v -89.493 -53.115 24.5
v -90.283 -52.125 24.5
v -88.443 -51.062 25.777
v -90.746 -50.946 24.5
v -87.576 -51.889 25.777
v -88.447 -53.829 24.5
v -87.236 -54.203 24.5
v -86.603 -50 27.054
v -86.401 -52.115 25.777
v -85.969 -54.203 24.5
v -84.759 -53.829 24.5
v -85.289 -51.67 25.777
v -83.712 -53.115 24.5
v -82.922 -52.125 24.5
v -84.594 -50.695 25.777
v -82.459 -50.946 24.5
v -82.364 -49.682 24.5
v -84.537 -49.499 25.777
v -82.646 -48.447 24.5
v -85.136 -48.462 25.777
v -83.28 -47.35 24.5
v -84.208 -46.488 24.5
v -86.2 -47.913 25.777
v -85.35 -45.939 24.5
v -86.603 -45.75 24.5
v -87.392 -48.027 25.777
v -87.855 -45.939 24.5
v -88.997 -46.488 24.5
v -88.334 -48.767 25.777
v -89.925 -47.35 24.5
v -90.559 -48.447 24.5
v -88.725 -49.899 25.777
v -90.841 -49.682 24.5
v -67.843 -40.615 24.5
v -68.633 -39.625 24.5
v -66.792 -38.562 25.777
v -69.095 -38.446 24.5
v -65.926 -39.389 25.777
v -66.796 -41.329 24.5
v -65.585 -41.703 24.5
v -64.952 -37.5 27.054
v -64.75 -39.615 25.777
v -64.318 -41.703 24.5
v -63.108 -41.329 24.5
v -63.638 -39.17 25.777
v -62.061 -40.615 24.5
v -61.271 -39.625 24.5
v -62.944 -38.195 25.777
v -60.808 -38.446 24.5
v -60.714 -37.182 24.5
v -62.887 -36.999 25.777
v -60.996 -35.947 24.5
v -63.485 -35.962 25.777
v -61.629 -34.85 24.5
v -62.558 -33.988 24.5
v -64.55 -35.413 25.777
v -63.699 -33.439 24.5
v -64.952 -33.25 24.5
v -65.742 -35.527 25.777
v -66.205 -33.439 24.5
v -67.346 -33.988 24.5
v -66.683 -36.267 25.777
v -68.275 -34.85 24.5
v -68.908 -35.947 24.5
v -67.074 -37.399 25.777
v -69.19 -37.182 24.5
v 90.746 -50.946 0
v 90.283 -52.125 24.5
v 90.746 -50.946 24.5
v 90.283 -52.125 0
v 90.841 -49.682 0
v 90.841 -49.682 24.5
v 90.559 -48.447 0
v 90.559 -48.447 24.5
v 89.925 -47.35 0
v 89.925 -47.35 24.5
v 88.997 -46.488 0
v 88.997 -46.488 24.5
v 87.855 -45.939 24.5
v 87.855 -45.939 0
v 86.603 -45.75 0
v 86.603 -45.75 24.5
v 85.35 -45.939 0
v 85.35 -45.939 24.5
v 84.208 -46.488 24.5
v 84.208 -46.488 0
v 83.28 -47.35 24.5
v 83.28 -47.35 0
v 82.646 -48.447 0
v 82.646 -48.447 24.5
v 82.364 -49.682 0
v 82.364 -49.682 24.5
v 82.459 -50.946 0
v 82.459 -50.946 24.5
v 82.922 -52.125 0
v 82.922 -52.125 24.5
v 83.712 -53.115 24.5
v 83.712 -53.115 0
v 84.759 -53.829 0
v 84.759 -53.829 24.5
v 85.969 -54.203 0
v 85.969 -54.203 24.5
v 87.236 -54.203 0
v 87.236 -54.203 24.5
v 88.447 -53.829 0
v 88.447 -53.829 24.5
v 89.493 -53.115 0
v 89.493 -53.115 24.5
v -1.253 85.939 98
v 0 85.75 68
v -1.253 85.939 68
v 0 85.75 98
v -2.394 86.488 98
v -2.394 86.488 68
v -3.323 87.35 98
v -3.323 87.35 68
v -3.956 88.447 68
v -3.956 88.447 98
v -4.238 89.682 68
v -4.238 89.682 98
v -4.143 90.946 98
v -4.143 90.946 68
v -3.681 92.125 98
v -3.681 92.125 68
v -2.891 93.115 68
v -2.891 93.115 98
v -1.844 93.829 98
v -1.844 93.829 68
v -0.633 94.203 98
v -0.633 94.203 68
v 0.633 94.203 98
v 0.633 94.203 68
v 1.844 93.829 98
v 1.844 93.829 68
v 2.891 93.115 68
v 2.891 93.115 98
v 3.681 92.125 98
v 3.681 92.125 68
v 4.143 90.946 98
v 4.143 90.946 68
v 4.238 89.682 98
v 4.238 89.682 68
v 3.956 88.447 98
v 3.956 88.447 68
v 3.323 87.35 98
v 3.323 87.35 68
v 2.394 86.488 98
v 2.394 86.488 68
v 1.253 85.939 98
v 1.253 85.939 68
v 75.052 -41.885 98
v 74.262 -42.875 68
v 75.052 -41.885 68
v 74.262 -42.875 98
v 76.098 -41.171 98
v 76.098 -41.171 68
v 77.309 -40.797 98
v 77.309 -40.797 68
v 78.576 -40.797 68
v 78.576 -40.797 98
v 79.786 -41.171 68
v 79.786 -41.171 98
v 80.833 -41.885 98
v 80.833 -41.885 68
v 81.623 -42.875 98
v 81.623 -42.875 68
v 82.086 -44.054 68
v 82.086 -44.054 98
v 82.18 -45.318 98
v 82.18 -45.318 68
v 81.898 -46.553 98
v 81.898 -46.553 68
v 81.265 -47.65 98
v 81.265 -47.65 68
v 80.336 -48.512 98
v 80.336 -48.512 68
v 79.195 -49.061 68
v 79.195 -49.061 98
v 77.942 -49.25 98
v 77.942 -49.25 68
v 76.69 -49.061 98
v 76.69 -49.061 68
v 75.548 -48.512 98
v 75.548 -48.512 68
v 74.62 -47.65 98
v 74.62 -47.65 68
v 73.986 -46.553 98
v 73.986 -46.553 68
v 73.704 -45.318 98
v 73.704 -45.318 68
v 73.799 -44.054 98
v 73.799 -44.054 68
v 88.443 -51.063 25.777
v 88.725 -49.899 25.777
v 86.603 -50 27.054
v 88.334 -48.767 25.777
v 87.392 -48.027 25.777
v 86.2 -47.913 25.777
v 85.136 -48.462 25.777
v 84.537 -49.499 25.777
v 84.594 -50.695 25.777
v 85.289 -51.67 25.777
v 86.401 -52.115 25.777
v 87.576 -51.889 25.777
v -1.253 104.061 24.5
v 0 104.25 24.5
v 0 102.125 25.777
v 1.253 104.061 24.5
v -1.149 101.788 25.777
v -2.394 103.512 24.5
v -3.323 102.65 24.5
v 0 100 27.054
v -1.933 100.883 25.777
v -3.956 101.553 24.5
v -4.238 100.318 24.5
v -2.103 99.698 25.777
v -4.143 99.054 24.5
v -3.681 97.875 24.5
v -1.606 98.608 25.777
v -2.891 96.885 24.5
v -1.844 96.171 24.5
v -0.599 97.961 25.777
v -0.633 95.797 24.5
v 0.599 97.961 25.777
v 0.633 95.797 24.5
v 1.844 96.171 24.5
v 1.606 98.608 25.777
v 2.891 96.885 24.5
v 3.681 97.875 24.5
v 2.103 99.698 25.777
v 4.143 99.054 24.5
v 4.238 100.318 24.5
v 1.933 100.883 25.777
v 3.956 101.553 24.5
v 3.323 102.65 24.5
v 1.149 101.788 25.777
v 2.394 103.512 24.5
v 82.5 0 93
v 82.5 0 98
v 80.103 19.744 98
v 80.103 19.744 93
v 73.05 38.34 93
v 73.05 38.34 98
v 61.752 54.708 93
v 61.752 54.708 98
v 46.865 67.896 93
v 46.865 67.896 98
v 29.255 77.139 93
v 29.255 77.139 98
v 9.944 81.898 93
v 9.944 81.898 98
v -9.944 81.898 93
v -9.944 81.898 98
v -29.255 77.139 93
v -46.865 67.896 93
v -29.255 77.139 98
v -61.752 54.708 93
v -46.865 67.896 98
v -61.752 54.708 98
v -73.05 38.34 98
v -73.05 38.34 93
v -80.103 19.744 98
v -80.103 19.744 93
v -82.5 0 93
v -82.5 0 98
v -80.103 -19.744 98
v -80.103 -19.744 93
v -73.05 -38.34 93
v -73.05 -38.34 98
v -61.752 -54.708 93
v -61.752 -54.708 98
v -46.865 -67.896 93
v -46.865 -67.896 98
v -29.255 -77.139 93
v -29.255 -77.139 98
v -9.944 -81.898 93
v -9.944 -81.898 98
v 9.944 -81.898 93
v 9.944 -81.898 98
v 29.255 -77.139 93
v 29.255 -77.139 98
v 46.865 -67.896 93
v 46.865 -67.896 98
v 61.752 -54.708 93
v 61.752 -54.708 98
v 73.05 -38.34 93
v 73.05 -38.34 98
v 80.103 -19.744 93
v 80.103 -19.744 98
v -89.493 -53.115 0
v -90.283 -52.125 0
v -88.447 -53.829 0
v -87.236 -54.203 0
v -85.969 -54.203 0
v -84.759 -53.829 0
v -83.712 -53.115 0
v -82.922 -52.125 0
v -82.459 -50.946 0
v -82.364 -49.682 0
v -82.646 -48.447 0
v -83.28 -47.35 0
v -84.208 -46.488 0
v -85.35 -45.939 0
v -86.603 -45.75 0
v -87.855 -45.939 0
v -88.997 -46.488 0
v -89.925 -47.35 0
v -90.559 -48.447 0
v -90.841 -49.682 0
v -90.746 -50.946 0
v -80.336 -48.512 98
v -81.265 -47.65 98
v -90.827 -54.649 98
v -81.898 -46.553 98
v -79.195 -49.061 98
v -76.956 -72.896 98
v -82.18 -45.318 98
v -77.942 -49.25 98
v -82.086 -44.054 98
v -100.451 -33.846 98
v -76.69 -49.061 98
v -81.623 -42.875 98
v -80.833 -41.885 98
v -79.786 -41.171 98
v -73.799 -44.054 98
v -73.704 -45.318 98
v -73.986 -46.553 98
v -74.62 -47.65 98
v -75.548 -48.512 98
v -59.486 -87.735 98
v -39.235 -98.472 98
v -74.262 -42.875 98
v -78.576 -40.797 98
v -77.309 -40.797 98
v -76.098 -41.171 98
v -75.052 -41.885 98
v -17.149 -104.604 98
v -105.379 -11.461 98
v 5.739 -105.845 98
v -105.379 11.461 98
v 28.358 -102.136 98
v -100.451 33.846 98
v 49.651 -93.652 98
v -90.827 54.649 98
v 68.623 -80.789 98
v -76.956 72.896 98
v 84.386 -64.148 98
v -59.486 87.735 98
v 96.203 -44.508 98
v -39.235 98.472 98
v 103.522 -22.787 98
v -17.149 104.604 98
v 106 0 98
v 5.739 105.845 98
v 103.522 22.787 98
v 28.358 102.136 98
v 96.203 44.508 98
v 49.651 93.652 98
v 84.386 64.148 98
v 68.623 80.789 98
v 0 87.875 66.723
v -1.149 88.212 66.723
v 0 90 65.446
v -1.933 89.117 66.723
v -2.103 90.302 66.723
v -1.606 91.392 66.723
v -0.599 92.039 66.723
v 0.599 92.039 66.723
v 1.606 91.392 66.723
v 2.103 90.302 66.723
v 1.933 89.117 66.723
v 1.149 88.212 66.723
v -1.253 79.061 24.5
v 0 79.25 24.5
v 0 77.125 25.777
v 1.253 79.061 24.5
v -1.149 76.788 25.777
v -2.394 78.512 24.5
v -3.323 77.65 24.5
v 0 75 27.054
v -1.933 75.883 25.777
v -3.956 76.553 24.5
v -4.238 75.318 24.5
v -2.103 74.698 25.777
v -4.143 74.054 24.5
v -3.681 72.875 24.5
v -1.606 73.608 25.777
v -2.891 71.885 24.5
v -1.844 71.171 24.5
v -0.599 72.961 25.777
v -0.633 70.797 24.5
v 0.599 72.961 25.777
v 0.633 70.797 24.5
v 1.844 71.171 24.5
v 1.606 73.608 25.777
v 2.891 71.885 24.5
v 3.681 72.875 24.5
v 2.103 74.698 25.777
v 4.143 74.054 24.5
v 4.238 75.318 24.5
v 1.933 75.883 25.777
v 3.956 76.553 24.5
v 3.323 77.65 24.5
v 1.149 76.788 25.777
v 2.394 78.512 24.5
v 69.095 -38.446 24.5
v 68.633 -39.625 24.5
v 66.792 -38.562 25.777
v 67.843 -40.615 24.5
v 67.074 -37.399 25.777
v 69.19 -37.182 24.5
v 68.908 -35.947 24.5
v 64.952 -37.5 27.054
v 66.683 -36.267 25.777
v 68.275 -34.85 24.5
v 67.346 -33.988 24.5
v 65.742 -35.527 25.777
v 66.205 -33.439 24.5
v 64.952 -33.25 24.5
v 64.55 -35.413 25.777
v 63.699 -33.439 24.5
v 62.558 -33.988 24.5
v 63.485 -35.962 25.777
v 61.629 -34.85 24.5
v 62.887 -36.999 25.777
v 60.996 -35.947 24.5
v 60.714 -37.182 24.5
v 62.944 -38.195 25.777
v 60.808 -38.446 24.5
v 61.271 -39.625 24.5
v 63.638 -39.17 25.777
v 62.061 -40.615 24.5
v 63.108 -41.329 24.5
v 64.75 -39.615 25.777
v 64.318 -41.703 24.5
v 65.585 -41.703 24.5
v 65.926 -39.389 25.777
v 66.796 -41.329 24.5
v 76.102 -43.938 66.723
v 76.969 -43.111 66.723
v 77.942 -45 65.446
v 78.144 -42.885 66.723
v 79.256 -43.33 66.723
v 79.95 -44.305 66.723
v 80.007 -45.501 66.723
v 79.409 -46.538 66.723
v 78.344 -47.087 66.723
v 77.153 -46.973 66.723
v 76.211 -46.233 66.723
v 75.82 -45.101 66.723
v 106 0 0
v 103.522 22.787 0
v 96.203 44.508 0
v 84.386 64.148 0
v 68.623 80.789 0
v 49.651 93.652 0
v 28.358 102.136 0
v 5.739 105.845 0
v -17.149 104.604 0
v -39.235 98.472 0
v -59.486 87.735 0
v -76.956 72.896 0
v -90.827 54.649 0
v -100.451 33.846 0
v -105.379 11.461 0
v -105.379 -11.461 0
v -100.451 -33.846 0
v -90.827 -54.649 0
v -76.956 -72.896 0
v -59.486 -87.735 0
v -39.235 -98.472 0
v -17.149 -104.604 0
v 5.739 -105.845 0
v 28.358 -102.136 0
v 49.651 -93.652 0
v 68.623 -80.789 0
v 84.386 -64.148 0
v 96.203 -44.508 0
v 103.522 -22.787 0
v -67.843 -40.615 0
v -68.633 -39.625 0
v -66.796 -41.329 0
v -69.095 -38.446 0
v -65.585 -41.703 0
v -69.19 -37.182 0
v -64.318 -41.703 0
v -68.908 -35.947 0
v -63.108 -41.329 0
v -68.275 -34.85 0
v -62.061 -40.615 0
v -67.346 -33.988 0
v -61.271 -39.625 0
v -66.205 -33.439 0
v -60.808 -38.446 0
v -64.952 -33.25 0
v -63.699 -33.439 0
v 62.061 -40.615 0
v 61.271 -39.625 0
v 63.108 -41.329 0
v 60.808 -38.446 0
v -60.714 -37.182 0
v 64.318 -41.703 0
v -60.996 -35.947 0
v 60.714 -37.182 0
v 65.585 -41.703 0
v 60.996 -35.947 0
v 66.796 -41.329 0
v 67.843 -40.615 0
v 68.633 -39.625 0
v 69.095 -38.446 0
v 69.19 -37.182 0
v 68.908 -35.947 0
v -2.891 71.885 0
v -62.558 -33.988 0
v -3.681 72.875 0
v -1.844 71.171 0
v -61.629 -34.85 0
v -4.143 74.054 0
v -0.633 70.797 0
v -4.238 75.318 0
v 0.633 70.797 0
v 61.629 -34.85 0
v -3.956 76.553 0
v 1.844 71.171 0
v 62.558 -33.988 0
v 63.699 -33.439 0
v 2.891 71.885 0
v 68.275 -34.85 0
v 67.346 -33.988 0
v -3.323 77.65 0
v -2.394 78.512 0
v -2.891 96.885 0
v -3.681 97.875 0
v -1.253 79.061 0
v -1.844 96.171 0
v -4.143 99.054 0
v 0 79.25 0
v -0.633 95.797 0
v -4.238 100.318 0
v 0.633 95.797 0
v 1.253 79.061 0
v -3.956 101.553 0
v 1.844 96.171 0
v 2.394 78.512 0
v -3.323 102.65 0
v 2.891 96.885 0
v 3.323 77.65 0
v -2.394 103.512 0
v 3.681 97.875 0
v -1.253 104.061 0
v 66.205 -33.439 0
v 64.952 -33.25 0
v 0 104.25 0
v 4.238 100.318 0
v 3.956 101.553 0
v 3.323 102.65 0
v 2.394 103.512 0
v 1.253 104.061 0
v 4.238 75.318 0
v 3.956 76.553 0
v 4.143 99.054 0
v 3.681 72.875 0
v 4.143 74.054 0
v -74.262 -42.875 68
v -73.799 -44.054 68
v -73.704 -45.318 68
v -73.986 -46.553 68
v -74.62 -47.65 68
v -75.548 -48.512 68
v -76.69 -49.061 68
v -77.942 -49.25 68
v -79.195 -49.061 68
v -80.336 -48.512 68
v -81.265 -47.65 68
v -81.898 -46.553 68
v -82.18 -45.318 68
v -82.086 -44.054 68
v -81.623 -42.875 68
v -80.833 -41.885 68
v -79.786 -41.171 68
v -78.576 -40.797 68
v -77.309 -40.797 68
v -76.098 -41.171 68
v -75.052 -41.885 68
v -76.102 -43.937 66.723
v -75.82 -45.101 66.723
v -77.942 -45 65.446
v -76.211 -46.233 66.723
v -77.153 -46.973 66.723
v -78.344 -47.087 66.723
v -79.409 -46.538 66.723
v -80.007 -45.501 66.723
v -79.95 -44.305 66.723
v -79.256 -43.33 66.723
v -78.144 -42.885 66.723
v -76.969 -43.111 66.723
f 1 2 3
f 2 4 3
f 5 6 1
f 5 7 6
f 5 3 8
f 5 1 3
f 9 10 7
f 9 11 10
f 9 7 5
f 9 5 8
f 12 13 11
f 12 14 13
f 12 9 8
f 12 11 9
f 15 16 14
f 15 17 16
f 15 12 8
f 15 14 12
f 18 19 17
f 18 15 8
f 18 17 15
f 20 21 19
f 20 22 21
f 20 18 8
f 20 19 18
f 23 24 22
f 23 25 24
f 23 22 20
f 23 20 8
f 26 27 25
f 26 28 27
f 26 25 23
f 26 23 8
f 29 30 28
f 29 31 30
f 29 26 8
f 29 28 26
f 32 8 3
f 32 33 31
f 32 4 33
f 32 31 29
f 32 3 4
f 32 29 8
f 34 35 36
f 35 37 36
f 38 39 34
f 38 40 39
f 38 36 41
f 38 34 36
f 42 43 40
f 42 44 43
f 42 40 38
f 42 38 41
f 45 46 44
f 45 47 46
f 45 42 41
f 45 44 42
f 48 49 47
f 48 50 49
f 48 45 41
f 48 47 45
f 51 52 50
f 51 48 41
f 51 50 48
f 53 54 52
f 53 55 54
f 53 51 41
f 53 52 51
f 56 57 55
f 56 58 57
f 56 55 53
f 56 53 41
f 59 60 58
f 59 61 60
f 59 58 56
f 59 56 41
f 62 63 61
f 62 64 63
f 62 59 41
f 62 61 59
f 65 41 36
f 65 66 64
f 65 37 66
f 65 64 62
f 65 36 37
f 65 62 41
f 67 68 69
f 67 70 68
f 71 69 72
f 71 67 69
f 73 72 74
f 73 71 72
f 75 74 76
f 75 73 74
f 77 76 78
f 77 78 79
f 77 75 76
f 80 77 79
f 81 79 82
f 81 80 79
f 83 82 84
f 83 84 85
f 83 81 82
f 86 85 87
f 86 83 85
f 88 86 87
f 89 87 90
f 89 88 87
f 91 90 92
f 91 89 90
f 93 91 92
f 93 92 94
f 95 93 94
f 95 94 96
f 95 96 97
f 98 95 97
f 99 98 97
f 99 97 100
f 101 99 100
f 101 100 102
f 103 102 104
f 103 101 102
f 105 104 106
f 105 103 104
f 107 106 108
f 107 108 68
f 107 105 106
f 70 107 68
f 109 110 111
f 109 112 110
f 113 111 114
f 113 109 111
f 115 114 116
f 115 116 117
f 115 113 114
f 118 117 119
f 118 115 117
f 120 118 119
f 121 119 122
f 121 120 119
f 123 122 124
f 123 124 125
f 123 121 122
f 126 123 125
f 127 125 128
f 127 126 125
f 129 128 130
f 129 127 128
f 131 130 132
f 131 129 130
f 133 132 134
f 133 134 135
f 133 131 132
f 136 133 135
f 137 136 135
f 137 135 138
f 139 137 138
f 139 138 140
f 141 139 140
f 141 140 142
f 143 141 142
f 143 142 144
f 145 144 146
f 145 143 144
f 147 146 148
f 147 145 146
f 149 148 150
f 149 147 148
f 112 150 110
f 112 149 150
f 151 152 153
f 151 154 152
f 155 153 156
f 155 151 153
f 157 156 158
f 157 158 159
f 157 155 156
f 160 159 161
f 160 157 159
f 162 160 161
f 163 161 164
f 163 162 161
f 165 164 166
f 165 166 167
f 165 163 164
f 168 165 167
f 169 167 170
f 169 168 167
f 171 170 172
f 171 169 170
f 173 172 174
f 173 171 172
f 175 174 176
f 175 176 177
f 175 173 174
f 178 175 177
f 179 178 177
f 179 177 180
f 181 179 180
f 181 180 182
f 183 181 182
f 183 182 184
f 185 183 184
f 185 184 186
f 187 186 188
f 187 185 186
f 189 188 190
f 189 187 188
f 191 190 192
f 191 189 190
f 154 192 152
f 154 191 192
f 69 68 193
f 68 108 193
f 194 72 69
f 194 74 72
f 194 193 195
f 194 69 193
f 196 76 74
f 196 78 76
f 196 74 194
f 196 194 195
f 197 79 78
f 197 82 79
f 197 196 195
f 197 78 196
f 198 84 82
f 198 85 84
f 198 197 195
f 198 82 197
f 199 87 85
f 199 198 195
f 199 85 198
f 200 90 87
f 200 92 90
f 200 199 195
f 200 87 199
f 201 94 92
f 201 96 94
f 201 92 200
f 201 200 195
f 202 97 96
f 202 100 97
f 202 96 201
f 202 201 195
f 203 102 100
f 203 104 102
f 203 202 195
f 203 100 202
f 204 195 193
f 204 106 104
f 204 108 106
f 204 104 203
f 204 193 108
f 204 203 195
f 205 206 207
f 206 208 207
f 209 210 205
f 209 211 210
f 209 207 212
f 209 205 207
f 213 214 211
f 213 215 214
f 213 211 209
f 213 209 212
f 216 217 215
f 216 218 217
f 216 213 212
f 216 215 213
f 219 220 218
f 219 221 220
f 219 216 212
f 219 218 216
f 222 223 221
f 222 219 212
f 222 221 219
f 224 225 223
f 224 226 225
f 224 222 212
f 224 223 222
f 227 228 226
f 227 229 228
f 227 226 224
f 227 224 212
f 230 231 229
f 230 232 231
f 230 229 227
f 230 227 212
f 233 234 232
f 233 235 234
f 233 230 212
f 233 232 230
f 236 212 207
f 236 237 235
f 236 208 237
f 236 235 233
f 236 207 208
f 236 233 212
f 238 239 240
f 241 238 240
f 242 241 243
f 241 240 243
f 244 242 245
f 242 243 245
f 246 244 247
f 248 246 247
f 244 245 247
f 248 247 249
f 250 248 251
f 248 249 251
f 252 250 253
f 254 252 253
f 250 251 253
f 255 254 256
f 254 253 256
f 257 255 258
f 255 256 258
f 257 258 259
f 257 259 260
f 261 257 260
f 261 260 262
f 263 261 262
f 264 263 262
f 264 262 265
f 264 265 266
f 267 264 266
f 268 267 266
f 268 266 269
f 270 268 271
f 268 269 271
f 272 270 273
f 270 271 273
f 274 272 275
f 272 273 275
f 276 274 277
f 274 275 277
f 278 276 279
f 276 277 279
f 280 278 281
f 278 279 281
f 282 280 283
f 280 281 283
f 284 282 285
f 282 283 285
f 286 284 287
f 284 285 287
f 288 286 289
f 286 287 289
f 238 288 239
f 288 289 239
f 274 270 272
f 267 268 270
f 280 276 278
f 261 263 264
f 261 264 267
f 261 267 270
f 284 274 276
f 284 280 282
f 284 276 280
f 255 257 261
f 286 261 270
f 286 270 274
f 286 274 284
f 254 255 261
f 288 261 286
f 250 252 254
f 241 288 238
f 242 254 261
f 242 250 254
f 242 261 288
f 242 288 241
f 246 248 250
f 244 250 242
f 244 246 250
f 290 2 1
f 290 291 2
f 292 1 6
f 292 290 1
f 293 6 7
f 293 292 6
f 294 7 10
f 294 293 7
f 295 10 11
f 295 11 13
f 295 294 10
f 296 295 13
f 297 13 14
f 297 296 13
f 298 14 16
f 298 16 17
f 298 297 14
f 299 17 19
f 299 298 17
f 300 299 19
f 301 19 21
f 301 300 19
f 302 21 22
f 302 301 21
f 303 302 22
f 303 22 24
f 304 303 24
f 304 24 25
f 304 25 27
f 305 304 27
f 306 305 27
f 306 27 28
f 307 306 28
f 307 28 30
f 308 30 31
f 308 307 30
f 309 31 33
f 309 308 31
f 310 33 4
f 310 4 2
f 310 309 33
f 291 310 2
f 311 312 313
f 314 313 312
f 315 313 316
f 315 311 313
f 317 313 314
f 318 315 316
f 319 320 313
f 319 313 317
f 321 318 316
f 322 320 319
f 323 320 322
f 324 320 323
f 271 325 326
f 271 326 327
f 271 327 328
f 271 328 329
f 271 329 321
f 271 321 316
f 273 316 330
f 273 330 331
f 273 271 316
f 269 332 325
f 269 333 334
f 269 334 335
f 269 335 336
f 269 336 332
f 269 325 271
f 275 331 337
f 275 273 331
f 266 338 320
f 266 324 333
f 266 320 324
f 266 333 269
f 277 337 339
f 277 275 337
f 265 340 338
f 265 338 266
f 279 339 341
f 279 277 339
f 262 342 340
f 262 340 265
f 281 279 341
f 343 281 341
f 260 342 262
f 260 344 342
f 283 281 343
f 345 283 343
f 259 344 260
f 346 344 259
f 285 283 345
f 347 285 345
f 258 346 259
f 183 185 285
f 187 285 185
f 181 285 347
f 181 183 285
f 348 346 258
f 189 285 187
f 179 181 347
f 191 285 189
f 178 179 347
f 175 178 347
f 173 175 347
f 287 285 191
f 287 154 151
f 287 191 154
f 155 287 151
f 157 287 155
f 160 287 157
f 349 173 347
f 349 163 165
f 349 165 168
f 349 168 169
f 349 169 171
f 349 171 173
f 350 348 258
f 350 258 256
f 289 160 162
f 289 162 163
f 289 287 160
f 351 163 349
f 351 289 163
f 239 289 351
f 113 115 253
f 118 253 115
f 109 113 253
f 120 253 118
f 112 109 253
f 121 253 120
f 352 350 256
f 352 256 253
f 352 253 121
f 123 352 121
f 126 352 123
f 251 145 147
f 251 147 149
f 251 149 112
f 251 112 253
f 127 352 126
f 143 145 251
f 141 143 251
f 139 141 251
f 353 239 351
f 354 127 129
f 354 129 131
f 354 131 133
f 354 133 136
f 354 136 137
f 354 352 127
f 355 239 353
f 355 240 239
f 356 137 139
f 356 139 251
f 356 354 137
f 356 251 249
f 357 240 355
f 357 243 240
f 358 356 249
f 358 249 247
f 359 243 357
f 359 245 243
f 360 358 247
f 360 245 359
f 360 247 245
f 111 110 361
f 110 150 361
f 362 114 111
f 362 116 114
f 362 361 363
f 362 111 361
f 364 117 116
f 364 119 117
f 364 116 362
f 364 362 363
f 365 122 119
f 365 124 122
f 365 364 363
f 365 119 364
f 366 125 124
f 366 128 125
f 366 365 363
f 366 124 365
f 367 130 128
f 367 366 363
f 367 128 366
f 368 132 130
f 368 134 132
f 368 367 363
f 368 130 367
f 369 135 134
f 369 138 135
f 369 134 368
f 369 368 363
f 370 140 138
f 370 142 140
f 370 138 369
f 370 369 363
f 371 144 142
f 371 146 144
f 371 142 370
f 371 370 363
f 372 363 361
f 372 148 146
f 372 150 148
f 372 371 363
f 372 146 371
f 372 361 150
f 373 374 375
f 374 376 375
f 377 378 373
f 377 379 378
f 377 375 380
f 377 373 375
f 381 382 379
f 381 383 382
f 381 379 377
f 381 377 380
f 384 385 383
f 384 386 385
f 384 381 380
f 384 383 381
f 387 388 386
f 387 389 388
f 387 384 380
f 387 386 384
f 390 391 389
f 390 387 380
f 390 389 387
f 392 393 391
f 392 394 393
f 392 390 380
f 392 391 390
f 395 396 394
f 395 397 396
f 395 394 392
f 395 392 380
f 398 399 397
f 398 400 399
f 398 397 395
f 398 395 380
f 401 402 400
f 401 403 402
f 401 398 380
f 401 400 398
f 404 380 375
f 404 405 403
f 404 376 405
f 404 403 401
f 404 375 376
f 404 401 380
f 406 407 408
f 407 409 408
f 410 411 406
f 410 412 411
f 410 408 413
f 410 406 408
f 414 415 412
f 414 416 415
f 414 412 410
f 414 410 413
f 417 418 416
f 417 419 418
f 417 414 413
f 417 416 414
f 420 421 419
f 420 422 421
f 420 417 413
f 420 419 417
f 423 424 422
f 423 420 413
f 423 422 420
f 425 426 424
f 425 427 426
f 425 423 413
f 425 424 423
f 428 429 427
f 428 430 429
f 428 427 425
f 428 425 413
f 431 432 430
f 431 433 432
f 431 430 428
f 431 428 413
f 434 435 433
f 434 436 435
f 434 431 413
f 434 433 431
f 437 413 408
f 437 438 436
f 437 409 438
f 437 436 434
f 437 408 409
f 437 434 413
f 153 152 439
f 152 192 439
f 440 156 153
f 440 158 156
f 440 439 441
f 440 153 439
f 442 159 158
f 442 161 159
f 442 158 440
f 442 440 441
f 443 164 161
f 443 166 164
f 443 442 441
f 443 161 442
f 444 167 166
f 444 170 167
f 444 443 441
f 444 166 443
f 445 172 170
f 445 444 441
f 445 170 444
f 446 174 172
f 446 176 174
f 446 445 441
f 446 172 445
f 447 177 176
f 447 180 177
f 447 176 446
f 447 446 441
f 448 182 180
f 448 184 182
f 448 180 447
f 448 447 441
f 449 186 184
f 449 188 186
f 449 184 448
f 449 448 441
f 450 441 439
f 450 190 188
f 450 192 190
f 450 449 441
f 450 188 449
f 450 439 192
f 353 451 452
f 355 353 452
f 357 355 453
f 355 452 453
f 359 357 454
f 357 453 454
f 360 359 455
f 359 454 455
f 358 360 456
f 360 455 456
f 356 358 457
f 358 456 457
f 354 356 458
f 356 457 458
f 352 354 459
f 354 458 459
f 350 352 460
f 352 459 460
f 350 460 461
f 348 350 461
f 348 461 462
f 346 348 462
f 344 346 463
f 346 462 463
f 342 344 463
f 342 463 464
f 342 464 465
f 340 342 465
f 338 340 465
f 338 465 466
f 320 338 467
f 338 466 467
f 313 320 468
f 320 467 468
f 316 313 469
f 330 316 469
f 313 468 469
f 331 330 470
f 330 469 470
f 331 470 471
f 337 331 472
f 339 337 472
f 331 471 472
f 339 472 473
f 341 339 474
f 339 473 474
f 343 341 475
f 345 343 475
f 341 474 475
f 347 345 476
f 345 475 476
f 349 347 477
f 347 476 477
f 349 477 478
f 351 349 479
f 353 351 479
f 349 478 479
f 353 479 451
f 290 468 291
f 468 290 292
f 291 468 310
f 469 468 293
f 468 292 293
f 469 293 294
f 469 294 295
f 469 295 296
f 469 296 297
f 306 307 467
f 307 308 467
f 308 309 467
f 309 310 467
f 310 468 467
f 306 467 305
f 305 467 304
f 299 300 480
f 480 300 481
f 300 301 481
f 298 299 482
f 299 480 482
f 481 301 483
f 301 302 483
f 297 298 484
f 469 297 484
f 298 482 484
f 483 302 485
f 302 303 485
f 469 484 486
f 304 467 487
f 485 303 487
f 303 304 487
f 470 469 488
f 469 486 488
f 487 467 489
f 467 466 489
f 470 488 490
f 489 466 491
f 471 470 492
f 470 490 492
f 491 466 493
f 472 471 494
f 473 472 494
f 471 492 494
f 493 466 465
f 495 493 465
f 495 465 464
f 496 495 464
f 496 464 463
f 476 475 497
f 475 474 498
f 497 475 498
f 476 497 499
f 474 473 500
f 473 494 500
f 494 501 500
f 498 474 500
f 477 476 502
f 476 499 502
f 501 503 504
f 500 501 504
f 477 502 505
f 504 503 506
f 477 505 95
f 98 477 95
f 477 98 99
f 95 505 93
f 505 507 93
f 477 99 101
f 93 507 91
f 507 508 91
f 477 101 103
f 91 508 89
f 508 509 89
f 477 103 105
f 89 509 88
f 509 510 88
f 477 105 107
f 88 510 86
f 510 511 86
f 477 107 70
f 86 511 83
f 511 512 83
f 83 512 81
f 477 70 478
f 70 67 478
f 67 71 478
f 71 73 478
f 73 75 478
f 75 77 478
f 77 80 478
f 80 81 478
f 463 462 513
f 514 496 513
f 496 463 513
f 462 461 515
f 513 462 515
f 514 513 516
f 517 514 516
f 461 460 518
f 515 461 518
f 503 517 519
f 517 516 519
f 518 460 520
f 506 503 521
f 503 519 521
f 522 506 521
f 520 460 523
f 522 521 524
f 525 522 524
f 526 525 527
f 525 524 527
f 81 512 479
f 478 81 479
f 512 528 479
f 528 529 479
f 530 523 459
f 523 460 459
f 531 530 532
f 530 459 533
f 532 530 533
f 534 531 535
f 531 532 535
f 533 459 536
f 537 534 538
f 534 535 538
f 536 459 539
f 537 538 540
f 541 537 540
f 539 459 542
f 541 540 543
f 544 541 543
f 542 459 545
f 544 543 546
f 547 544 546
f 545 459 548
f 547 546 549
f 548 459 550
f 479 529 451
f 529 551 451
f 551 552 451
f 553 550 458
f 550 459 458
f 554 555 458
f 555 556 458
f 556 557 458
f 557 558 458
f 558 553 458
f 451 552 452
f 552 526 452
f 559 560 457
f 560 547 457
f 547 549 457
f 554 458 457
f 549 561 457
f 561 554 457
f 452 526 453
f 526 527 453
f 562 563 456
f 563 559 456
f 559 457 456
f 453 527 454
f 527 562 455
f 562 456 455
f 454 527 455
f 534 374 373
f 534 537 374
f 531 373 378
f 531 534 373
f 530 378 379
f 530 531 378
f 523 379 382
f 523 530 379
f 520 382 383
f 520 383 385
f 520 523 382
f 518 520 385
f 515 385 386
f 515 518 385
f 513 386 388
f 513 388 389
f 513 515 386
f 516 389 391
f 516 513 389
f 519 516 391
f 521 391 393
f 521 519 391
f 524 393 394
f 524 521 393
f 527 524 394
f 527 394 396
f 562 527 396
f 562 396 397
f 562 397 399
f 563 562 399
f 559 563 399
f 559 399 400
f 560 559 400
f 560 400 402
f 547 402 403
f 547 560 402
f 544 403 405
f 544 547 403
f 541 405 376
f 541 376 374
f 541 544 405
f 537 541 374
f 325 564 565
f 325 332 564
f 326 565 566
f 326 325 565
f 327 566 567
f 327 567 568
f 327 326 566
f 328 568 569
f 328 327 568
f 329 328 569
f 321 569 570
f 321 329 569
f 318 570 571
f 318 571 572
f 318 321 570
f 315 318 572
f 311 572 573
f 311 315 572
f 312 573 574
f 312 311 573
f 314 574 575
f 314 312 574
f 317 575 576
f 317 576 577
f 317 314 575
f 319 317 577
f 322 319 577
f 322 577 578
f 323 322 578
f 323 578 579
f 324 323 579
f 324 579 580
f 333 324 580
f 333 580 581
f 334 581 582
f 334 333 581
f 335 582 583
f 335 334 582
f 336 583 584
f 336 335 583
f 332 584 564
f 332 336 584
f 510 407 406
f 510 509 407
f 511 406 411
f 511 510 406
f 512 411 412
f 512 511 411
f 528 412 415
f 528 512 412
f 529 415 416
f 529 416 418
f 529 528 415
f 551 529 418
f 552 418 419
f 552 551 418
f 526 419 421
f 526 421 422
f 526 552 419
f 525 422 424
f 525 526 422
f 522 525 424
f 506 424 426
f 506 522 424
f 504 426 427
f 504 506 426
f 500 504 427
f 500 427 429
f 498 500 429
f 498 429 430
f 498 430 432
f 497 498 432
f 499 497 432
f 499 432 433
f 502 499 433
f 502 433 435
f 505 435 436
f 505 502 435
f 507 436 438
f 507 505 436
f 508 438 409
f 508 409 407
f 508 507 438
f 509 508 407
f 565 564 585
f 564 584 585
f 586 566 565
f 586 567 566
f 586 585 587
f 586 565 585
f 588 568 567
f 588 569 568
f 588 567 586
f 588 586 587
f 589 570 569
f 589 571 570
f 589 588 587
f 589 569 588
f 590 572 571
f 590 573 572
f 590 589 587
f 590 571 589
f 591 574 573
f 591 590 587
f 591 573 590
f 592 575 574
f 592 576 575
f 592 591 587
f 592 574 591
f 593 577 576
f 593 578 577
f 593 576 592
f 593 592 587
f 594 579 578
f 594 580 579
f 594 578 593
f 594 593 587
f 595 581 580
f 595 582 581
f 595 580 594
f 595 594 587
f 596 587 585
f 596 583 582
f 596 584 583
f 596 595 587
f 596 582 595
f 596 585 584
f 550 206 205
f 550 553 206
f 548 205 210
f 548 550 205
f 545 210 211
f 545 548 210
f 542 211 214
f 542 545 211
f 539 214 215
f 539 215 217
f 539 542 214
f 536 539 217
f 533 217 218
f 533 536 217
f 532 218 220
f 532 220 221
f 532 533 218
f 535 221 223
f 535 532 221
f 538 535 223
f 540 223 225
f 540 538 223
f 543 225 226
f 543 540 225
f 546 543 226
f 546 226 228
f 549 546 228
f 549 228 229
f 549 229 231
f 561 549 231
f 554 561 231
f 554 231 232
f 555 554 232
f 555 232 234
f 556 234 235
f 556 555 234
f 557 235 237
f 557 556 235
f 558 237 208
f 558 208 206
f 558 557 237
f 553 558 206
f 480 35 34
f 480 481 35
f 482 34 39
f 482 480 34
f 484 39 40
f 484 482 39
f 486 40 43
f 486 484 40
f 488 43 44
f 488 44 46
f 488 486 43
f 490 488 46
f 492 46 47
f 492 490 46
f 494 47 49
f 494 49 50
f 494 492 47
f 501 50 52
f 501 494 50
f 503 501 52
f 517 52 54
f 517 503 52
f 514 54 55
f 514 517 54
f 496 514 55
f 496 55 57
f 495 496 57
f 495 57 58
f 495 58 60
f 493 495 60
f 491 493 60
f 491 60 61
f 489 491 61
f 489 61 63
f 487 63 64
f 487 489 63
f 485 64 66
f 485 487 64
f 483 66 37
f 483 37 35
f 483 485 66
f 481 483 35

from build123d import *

# Parameters (mm, degrees)
SKETCH_1_R                   = 106
EXTRUDE_1_DEPTH              = 98
SKETCH_2_R                   = 82.5
CUT_EXTRUDE_1_DEPTH          = 5
PATTERN_CIRCULAR_1_COUNT     = 3
HOLE_WIZARD_M10_2_AT_2_COUNT = 2
HOLE_WIZARD_M10_2_AT_2_PITCH = 25
PATTERN_CIRCULAR_2_COUNT     = 3


with BuildPart() as part:
    # 草图1 → 凸台-拉伸1 (new body)
    with BuildSketch(Plane.XY):
        Circle(SKETCH_1_R)
    extrude(amount=EXTRUDE_1_DEPTH)

    # 草图2 → 切除-拉伸1 (cut)
    with BuildSketch(Plane.XY.offset(98)):
        Circle(SKETCH_2_R)
    extrude(amount=-CUT_EXTRUDE_1_DEPTH, mode=Mode.SUBTRACT)

    # 草图3 → M10 螺纹孔1 (revolve, cut)
    with BuildSketch(Plane(origin=(0, 90, 98), x_dir=(0, -1, 0), z_dir=(1, 0, 0))):
        Polygon((0, 0), (0, 32.553657631), (4.25, 30), (4.25, 0), align=None)
    hole_wizard_m10_1 = revolve(axis=Axis((0, 90, 104.35), (0, 0, -1)), mode=Mode.SUBTRACT)

    # 阵列(圆周)1: M10 螺纹孔1 ×3 about axis
    pattern_circular_1_axis = Axis((0, 0, 0), (0, 0, 1))
    for i in range(1, PATTERN_CIRCULAR_1_COUNT):
        add(hole_wizard_m10_1.rotate(pattern_circular_1_axis, i * 360 / PATTERN_CIRCULAR_1_COUNT), mode=Mode.SUBTRACT)

    # 草图5 → M10 螺纹孔2 (revolve, cut)
    with BuildSketch(Plane(origin=(0, 100, 0), x_dir=(0, 1, 0), z_dir=(1, 0, 0))):
        Polygon((0, 0), (0, 27.053657631), (4.25, 24.5), (4.25, 0), align=None)
    hole_wizard_m10_2 = revolve(axis=Axis((0, 100, -6.35), (0, 0, 1)), mode=Mode.SUBTRACT)

    # M10 螺纹孔2 at 2: M10 螺纹孔2 ×2
    with Locations(*[(0, -i * HOLE_WIZARD_M10_2_AT_2_PITCH, 0) for i in range(1, HOLE_WIZARD_M10_2_AT_2_COUNT)]):
        add(hole_wizard_m10_2, mode=Mode.SUBTRACT)

    # 阵列(圆周)2: M10 螺纹孔2 ×3 about axis
    pattern_circular_2_axis = Axis((0, 0, 0), (0, 0, 1))
    for i in range(1, PATTERN_CIRCULAR_2_COUNT):
        add(hole_wizard_m10_2.rotate(pattern_circular_2_axis, i * 360 / PATTERN_CIRCULAR_2_COUNT), mode=Mode.SUBTRACT)

    # 阵列(圆周)2 copy 1 sketch → 阵列(圆周)2 copy 1 (revolve, cut)
    with BuildSketch(Plane(origin=(-64.951905284, -37.5, 0), x_dir=(-0.8660254037844387, -0.4999999999999998, 0), z_dir=(-0.4999999999999998, 0.8660254037844387, 0))):
        Polygon((0, 0), (0, 27.053657631), (4.25, 24.5), (4.25, 0), align=None)
    revolve(axis=Axis((-64.951905284, -37.5, -6.35), (0, 0, 1)), mode=Mode.SUBTRACT)

    # 阵列(圆周)2 copy 2 sketch → 阵列(圆周)2 copy 2 (revolve, cut)
    with BuildSketch(Plane(origin=(64.951905284, -37.5, 0), x_dir=(0.8660254037844384, -0.5000000000000004, 0), z_dir=(-0.5000000000000004, -0.8660254037844384, 0))):
        Polygon((0, 0), (0, 27.053657631), (4.25, 24.5), (4.25, 0), align=None)
    revolve(axis=Axis((64.951905284, -37.5, -6.35), (0, 0, 1)), mode=Mode.SUBTRACT)


solid = part.part
